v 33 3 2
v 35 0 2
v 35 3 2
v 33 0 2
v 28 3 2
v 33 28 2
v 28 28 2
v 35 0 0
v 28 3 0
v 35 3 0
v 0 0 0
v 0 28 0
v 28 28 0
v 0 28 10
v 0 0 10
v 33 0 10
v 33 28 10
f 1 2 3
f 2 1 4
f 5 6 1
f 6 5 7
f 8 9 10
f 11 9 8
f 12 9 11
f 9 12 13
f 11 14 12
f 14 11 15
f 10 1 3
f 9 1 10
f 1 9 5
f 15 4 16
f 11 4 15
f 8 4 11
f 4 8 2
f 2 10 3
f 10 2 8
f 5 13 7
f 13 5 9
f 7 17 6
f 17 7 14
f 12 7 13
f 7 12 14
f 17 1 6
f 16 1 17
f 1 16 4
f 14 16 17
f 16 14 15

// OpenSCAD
translate([2.5, 1.5, 1.0]) color([0.5086001300626332, 0.3114460010002068, 0.35715168259026286]) cube([5, 3, 2], center=true);
translate([7.5, 1.5, 1.0]) color([0.837661174368979, 0.25093266482213705, 0.560600218853524]) cube([5, 3, 2], center=true);
translate([12.5, 1.5, 1.0]) color([0.012436318829314397, 0.7415743774106636, 0.3359165544734606]) cube([5, 3, 2], center=true);
translate([17.5, 1.5, 1.0]) color([0.04569649356841665, 0.28088316421834825, 0.24013040782635398]) cube([5, 3, 2], center=true);
translate([22.5, 1.5, 1.0]) color([0.9531293398277989, 0.35222556151550743, 0.2878779148564]) cube([5, 3, 2], center=true);
translate([27.5, 1.5, 1.0]) color([0.35920119725374633, 0.9469058356578911, 0.6337478522492526]) cube([5, 3, 2], center=true);
translate([32.5, 1.5, 1.0]) color([0.6210768456186673, 0.7156193503014563, 0.38801723531250565]) cube([5, 3, 2], center=true);
translate([3.5, 5.5, 2.5]) color([0.4144179882772473, 0.650832862263345, 0.001524221856720187]) cube([7, 5, 5], center=true);
translate([10.5, 5.5, 2.5]) color([0.1923095412446758, 0.3344016906625016, 0.23941596018595857]) cube([7, 5, 5], center=true);
translate([17.5, 5.5, 2.5]) color([0.6373994011293003, 0.37864807032309444, 0.8754233917130172]) cube([7, 5, 5], center=true);
translate([24.5, 5.5, 2.5]) color([0.5681514209101919, 0.4144063966836443, 0.40226707511907955]) cube([7, 5, 5], center=true);
translate([3.5, 10.5, 2.5]) color([0.7018296239336754, 0.41822655329246605, 0.6621958889738174]) cube([7, 5, 5], center=true);
translate([10.5, 10.5, 2.5]) color([0.04677968595679827, 0.44535218971882984, 0.25922692344722276]) cube([7, 5, 5], center=true);
translate([17.5, 10.5, 2.5]) color([0.15768657212231085, 0.5275731301676146, 0.48726560106903205]) cube([7, 5, 5], center=true);
translate([24.5, 10.5, 2.5]) color([0.5614049256144269, 0.7554847672586825, 0.8838751542487009]) cube([7, 5, 5], center=true);
translate([3.5, 15.5, 2.5]) color([0.4945826703752868, 0.31205824641687296, 0.46689223535252355]) cube([7, 5, 5], center=true);
translate([10.5, 15.5, 2.5]) color([0.8090458573603624, 0.8750163314802711, 0.8124149323637591]) cube([7, 5, 5], center=true);
translate([17.5, 15.5, 2.5]) color([0.188001294050828, 0.9994203594553304, 0.6330887599183004]) cube([7, 5, 5], center=true);
translate([24.5, 15.5, 2.5]) color([0.08346705017572931, 0.7255543554613124, 0.9868214802051282]) cube([7, 5, 5], center=true);
translate([3.5, 20.5, 2.5]) color([0.40181682221254356, 0.6785150052419683, 0.31617713722134233]) cube([7, 5, 5], center=true);
translate([10.5, 20.5, 2.5]) color([0.2135246620646961, 0.7173241433110372, 0.0023575647193538884]) cube([7, 5, 5], center=true);
translate([17.5, 20.5, 2.5]) color([0.8227314105314157, 0.5283459768597928, 0.09778434180065931]) cube([7, 5, 5], center=true);
translate([24.5, 20.5, 2.5]) color([0.11890389478474583, 0.6492654248961536, 0.8736538239003423]) cube([7, 5, 5], center=true);
translate([3.5, 25.5, 2.5]) color([0.27998274332687256, 0.9785151867733981, 0.10018068906370903]) cube([7, 5, 5], center=true);
translate([10.5, 25.5, 2.5]) color([0.8539381095973382, 0.39669617733090445, 0.08134541676823415]) cube([7, 5, 5], center=true);
translate([17.5, 25.5, 2.5]) color([0.2747138434192621, 0.4529781848179143, 0.7923415311856522]) cube([7, 5, 5], center=true);
translate([24.5, 25.5, 2.5]) color([0.8613599036372361, 0.13342055420254906, 0.5208655284141989]) cube([7, 5, 5], center=true);
translate([5.5, 3.5, 3.5]) color([0.6507832381497373, 0.3470530145996015, 0.8718638357105861]) cube([11, 7, 3], center=true);
translate([16.5, 3.5, 3.5]) color([0.27840981521636055, 0.01857432754559518, 0.0406632736752609]) cube([11, 7, 3], center=true);
translate([27.5, 3.5, 3.5]) color([0.6809967701112433, 0.5583557360970469, 0.946502554169996]) cube([11, 7, 3], center=true);
translate([5.5, 10.5, 3.5]) color([0.9384387997349186, 0.9098511774051025, 0.04200453196734122]) cube([11, 7, 3], center=true);
translate([16.5, 10.5, 3.5]) color([0.7491348233908631, 0.7013248175948597, 0.6553618646747296]) cube([11, 7, 3], center=true);
translate([27.5, 10.5, 3.5]) color([0.7123576525162417, 0.9027101506193307, 0.6401411997932241]) cube([11, 7, 3], center=true);
translate([5.5, 17.5, 3.5]) color([0.372449262972256, 0.5379287837318205, 0.20784410369082473]) cube([11, 7, 3], center=true);
translate([16.5, 17.5, 3.5]) color([0.5871255046951435, 0.008897082049078797, 0.15102317386398778]) cube([11, 7, 3], center=true);
translate([27.5, 17.5, 3.5]) color([0.3334083880298664, 0.7896231589257826, 0.7184994227715396]) cube([11, 7, 3], center=true);
translate([5.5, 24.5, 3.5]) color([0.3382559700266786, 0.6205381083165517, 0.041202949506209285]) cube([11, 7, 3], center=true);
translate([16.5, 24.5, 3.5]) color([0.16386054567557595, 0.9819140701253054, 0.28953085363586695]) cube([11, 7, 3], center=true);
translate([27.5, 24.5, 3.5]) color([0.39479198298829066, 0.5484842965725134, 0.29340700145733656]) cube([11, 7, 3], center=true);
translate([5.5, 3.5, 7.5]) color([0.47806466915102097, 0.2397060836386239, 0.04825636228829444]) cube([11, 7, 5], center=true);
translate([16.5, 3.5, 7.5]) color([0.17958684904155564, 0.5230502317000981, 0.07086288409434749]) cube([11, 7, 5], center=true);
translate([27.5, 3.5, 7.5]) color([0.4031691464450935, 0.3285207100154869, 0.4147216089714424]) cube([11, 7, 5], center=true);
translate([5.5, 10.5, 7.5]) color([0.09940033823870109, 0.9086575543967805, 0.4740046511372964]) cube([11, 7, 5], center=true);
translate([16.5, 10.5, 7.5]) color([0.8408483326276716, 0.976229457649057, 0.34365159365776776]) cube([11, 7, 5], center=true);
translate([27.5, 10.5, 7.5]) color([0.4790865191519861, 0.6995952911506185, 0.42653532354402823]) cube([11, 7, 5], center=true);
translate([5.5, 17.5, 7.5]) color([0.30190311621935595, 0.7347509912186152, 0.8943997782145745]) cube([11, 7, 5], center=true);
translate([16.5, 17.5, 7.5]) color([0.9196888444316101, 0.6267420468068673, 0.3755713463285453]) cube([11, 7, 5], center=true);
translate([27.5, 17.5, 7.5]) color([0.9745605214796941, 0.6388785175004733, 0.06583467727730097]) cube([11, 7, 5], center=true);
translate([5.5, 24.5, 7.5]) color([0.08466956912011114, 0.749869571783086, 0.06115615654596607]) cube([11, 7, 5], center=true);
translate([16.5, 24.5, 7.5]) color([0.007851005331251826, 0.39380795178170946, 0.5190037287013293]) cube([11, 7, 5], center=true);
translate([27.5, 24.5, 7.5]) color([0.44854428559655457, 0.48861880442715255, 0.5848887019932744]) cube([11, 7, 5], center=true);
